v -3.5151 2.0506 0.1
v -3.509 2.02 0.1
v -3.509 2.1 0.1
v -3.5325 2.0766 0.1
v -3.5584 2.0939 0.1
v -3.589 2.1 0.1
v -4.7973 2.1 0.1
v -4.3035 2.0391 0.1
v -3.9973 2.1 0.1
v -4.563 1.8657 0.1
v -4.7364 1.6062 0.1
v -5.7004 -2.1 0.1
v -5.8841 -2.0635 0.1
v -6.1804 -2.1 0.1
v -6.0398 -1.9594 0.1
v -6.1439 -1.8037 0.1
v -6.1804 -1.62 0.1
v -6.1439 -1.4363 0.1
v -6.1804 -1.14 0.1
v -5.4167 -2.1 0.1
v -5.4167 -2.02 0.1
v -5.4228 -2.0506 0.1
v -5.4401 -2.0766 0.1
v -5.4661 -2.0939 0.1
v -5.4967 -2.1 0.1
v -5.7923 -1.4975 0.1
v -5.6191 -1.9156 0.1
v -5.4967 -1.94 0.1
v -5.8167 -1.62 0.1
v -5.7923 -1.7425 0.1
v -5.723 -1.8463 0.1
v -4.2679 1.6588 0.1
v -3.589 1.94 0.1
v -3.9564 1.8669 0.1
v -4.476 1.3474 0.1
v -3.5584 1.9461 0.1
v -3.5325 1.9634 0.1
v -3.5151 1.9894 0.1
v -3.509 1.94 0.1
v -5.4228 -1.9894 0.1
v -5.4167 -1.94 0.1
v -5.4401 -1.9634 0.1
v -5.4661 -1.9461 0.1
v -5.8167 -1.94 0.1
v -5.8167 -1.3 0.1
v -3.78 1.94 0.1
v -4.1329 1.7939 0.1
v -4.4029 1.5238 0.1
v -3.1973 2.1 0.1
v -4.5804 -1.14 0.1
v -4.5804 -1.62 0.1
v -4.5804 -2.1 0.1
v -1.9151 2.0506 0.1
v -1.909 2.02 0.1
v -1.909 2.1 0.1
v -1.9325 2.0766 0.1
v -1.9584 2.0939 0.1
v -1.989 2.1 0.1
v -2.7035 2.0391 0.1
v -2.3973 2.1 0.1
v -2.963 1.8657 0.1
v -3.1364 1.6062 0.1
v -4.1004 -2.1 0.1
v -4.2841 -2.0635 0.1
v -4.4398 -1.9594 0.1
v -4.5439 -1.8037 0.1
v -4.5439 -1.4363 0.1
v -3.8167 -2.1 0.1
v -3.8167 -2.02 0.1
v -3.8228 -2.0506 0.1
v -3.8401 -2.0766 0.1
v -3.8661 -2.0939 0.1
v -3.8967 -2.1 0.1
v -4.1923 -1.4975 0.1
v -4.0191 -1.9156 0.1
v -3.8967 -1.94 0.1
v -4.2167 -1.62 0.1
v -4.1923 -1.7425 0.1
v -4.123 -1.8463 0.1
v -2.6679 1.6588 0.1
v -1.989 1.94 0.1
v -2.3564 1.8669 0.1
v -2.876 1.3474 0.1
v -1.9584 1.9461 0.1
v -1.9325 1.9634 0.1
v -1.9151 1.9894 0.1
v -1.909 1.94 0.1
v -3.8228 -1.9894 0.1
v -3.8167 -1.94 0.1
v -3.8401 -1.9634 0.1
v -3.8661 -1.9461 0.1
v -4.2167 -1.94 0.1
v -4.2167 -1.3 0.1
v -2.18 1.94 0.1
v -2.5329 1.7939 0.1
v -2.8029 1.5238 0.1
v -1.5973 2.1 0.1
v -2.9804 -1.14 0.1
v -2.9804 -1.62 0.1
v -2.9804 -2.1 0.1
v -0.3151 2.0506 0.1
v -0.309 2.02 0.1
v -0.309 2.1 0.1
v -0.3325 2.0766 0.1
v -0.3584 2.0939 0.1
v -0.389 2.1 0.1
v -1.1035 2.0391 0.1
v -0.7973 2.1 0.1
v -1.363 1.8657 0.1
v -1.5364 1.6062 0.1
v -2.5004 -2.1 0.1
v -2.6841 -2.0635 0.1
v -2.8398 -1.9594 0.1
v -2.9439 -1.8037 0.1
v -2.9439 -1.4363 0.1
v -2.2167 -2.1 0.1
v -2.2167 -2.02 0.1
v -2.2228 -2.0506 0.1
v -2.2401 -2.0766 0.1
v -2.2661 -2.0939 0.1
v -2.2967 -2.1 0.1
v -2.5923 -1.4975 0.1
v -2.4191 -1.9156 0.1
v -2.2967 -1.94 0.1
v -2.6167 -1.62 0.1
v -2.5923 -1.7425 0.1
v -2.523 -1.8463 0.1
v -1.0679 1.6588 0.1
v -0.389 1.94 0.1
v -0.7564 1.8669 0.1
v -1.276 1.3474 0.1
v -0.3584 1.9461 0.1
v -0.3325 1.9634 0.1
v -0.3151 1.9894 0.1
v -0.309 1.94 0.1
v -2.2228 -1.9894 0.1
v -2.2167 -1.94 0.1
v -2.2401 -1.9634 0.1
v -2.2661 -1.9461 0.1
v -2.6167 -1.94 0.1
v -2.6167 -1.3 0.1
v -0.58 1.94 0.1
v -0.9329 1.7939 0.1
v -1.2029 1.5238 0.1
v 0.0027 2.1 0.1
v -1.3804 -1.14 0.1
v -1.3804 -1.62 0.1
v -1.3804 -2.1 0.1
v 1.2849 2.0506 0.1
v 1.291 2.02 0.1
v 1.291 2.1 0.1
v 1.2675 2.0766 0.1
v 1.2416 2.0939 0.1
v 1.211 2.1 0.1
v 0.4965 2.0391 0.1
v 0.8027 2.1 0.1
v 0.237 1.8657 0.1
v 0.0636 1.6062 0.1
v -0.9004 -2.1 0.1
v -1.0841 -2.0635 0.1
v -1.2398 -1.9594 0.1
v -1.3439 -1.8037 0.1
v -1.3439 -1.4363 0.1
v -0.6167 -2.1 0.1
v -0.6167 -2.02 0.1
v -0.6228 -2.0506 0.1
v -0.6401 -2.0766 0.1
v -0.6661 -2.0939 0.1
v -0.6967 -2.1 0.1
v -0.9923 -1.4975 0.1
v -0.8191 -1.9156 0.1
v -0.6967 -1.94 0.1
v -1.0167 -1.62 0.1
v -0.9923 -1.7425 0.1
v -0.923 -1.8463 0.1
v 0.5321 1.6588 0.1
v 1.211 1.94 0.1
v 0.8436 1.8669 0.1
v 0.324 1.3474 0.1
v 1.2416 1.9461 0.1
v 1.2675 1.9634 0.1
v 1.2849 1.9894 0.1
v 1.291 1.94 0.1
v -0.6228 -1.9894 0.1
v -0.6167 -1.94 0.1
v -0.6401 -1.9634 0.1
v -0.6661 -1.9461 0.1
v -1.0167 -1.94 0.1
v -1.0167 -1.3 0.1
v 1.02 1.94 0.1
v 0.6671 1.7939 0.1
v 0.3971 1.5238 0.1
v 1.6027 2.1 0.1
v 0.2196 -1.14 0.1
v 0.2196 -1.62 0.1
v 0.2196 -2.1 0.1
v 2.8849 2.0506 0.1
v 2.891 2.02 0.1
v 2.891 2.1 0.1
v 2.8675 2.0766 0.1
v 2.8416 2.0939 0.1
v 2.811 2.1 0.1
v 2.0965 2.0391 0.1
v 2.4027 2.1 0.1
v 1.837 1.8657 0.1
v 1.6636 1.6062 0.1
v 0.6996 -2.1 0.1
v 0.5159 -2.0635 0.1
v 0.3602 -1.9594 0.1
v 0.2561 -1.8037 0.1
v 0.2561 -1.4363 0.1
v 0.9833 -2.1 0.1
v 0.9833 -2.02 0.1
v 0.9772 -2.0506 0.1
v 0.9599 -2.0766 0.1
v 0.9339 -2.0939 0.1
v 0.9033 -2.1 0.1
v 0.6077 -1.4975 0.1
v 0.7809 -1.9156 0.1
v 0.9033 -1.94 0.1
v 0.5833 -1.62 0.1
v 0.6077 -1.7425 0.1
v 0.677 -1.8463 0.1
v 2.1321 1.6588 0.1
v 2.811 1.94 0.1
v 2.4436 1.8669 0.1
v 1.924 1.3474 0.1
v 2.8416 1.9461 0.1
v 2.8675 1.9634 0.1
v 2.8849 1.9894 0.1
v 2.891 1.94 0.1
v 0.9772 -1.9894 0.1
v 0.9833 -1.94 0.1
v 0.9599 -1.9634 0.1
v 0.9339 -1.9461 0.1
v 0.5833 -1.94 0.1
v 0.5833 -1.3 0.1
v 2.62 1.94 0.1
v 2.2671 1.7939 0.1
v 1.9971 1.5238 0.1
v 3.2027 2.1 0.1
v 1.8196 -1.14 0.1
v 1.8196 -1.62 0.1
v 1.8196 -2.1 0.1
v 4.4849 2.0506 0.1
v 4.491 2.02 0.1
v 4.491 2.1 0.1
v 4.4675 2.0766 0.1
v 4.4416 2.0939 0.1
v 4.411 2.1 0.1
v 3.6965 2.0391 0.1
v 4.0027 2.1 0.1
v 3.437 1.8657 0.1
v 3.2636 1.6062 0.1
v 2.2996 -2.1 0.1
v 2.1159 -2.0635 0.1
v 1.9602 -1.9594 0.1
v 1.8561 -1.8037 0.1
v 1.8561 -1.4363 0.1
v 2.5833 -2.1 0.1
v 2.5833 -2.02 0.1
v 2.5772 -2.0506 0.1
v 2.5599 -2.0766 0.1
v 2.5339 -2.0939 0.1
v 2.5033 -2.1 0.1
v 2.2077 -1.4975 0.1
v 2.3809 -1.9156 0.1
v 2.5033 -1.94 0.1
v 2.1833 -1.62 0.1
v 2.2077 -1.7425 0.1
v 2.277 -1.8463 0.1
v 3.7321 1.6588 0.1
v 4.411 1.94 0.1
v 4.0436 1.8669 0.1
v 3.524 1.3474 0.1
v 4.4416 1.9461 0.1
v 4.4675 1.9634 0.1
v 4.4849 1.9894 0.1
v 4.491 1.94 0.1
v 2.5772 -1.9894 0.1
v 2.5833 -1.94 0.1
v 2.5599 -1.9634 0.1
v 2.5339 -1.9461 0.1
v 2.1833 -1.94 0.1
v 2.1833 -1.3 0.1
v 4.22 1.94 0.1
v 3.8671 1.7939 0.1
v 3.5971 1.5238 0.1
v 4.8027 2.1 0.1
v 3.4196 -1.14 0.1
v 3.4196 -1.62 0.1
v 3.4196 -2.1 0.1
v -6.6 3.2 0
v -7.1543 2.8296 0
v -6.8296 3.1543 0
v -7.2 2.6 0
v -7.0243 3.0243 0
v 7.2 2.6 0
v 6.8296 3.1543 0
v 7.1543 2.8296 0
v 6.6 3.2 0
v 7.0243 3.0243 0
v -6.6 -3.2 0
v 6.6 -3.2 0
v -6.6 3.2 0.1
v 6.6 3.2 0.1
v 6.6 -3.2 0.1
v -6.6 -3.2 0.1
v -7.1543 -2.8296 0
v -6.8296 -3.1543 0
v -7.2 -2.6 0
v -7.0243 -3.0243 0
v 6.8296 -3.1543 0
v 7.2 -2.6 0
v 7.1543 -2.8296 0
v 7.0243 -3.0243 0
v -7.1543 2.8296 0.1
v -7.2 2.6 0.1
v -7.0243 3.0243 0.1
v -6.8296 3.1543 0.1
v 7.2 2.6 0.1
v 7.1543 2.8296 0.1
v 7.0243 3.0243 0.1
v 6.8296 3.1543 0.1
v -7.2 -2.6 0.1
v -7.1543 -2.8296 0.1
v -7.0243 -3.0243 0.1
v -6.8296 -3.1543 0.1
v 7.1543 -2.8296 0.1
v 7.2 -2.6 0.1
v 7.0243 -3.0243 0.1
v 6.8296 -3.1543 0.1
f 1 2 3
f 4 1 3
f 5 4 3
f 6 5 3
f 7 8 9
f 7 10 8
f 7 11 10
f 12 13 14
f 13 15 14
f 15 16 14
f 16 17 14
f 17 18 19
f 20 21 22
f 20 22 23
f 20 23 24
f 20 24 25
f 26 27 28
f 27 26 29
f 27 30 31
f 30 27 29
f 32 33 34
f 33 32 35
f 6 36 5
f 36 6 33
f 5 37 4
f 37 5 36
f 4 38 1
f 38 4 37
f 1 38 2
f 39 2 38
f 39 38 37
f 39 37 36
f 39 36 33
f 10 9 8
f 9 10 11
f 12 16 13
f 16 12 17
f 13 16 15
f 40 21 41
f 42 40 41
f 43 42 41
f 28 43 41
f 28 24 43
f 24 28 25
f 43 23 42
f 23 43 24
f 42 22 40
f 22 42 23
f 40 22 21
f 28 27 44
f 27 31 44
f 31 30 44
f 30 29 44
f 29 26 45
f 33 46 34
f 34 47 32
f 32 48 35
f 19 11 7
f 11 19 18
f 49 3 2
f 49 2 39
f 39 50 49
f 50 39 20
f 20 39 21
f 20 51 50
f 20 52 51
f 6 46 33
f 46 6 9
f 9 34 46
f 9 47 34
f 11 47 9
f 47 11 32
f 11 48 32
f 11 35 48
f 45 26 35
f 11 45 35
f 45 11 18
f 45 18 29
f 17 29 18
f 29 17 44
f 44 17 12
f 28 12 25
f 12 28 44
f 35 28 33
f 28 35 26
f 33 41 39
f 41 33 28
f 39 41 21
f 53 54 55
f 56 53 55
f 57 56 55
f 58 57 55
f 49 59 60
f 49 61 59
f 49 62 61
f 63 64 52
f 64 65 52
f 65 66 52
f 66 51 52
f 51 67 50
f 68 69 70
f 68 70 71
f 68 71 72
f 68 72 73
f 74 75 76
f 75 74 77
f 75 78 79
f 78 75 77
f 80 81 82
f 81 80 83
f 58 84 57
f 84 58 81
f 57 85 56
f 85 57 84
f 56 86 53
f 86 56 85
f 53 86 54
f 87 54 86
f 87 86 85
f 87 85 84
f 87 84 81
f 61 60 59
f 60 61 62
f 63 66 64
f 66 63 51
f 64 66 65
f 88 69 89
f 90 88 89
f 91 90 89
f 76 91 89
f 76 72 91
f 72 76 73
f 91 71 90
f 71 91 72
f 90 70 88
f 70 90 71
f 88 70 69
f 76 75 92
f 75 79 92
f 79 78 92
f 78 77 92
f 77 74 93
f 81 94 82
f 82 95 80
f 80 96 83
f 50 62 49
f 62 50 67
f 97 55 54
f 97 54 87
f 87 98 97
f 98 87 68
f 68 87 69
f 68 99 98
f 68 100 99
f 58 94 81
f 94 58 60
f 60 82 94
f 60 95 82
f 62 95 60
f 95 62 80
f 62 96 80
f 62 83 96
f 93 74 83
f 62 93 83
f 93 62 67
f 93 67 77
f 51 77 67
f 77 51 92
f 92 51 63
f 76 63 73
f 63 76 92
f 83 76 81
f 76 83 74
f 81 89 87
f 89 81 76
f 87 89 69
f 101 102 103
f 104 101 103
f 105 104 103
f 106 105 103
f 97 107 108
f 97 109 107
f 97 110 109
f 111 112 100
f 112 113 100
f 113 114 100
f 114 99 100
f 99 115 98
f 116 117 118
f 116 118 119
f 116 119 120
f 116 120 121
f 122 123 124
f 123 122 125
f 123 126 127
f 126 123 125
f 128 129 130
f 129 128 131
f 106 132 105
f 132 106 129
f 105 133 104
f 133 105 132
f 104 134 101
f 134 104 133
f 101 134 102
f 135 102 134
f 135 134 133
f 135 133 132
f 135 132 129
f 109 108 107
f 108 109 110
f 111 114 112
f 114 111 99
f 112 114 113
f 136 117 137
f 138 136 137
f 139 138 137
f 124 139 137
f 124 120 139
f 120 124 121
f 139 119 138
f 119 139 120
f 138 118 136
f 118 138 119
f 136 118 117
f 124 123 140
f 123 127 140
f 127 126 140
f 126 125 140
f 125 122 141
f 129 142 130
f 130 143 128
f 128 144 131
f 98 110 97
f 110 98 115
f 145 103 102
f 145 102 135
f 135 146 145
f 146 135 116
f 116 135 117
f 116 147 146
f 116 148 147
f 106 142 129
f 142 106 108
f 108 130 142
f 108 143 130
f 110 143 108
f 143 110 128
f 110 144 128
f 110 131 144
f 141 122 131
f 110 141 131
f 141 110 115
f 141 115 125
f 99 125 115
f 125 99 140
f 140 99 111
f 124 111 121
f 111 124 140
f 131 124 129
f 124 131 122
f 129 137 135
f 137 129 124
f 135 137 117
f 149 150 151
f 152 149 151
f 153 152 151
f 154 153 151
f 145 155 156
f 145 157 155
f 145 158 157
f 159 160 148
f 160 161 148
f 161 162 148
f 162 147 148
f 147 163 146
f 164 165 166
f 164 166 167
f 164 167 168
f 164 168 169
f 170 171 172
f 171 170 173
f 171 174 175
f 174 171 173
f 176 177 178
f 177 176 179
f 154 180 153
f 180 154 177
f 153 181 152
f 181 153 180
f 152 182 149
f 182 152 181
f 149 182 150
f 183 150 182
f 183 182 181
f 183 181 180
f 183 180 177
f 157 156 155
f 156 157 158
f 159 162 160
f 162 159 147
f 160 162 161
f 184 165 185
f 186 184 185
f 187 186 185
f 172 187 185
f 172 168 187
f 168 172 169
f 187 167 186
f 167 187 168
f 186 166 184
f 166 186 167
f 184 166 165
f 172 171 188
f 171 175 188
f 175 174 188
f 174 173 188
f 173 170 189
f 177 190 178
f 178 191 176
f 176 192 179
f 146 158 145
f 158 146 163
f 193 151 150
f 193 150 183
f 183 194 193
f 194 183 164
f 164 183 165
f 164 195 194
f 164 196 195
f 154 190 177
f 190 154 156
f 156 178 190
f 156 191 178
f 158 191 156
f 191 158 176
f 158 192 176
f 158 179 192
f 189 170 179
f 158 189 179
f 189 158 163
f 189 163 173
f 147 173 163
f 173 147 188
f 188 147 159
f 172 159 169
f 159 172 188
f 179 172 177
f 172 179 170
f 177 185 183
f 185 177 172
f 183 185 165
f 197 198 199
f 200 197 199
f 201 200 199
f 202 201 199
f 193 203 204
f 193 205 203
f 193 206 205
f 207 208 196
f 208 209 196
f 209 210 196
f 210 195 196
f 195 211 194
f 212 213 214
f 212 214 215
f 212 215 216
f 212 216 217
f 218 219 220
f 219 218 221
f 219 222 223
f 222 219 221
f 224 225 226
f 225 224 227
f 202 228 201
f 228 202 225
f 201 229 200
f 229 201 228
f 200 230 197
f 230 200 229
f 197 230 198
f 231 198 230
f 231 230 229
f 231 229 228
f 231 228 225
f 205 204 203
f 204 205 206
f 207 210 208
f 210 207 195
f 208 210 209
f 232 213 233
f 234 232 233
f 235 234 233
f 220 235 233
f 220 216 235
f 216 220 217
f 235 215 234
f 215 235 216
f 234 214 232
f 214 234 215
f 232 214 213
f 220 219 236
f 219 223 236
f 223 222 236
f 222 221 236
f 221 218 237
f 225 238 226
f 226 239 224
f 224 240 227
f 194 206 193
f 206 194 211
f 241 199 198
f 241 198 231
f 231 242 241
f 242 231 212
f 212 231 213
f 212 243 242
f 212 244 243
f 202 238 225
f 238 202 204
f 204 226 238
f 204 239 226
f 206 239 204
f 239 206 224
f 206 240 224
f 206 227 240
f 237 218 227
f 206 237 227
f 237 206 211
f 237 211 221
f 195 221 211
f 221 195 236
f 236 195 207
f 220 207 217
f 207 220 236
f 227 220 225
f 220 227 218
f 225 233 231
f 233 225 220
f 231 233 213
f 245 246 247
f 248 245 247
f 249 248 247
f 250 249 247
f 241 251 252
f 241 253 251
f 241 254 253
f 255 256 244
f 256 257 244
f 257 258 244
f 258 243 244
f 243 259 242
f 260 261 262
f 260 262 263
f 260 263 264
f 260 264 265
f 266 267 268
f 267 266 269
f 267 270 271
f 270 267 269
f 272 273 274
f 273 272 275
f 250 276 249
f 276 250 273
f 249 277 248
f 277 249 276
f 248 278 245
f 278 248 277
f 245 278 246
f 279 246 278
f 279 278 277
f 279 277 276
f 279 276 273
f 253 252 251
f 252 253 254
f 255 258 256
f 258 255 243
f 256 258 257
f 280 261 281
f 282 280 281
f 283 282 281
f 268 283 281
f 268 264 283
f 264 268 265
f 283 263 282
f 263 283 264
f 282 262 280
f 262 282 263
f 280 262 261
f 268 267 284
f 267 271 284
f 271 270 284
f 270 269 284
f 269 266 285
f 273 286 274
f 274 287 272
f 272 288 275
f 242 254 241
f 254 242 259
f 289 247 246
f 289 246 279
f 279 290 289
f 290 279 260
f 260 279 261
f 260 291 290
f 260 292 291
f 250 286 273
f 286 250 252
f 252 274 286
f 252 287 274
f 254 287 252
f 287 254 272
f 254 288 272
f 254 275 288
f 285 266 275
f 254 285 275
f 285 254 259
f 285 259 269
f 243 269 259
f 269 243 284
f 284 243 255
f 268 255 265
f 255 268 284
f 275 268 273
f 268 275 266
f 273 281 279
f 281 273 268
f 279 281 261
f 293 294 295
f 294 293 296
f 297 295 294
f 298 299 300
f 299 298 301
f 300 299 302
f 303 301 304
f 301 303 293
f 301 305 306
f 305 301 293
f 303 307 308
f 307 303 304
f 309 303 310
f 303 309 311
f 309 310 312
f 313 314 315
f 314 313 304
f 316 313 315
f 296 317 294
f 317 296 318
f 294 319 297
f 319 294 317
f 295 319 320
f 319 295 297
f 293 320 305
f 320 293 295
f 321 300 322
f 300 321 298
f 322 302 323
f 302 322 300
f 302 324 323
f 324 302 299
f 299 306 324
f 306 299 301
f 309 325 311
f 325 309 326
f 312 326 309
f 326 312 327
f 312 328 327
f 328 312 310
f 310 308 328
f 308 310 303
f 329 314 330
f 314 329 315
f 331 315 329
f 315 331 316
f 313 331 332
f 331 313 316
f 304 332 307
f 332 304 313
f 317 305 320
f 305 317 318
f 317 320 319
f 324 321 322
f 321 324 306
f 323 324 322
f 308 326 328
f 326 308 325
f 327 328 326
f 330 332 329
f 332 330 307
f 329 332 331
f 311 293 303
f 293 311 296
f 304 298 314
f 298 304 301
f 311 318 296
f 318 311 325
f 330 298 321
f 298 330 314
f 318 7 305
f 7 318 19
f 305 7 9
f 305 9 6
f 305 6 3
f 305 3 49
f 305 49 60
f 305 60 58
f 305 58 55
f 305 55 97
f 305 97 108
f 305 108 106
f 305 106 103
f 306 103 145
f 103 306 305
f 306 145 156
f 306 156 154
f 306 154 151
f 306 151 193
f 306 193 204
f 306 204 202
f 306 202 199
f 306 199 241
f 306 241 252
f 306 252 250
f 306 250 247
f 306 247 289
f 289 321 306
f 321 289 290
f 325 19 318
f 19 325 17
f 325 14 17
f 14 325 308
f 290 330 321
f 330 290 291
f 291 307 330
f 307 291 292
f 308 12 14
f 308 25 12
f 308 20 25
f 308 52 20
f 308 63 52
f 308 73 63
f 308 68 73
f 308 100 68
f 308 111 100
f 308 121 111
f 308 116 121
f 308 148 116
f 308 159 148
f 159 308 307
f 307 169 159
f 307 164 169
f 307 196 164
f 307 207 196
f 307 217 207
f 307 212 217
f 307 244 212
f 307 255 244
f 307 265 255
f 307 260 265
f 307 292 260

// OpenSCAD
// file: ../p/empty.scad
use <../lib.scad>
function ldraw_lib__empty() = [
// 0 Empty
// 0 Name: empty.dat
// 0 Author: Steffen [Steffen]
// 0 !LDRAW_ORG Primitive UPDATE 2015-01
// 0 !LICENSE Licensed under CC BY 4.0 : see CAreadme.txt
// 
// 0 BFC CERTIFY CCW
  [0,"BFC","CERTIFY"],
  [0,"BFC","CCW"],
// 
// 0 !HISTORY 2015-10-11 [PTadmin] Official Update 2015-01
// 
// 
// 0 // // Tool MLCad cannot handle really empty files. This file is used as a workaround.
// 0 // // It exceptionally contains forbidden non-LDRAW standard syntax to satisfy MLCad until it is fixed OR a different editor has become the de-facto LDRAW standard.
// 0 // // The line being used here is an "impossible" conditional line which never should be visible,
// 0 // // additionally hidden by a syntax explicitly hiding it from displaying.
// 
// 0 // MLCAD HIDE 5 24 0 0 0 0.0001 0 0 0.0001 -0.0001 0 0 0 0
];
module ldraw_lib__empty(step=0, col=false, unit=2/5, alt=false, line=0.2, solid=!$preview)
    makepoly(ldraw_lib__empty(), step=step, col=col, unit=unit, alt=alt, line=line, solid=solid);
ldraw_lib__empty(line=0.2);
// file: ../p/5-16ndis.scad
use <../lib.scad>
function ldraw_lib__5_16ndis() = [
// 0 Disc Negative 0.3125
// 0 Name: 5-16ndis.dat
// 0 Author: Max Martin Richter [MMR1988]
// 0 !LDRAW_ORG Primitive UPDATE 2013-01
// 0 !LICENSE Licensed under CC BY 4.0 : see CAreadme.txt
// 
// 0 BFC CERTIFY CCW
  [0,"BFC","CERTIFY"],
  [0,"BFC","CCW"],
// 
// 0 !HISTORY 2013-07-21 [PTadmin] Official Update 2013-01
// 
// 
// 3 16 1 0 1 0.9239 0 0.3827 1 0 0
  [3,16,1,0,1,0.9239,0,0.3827,1,0,0],
// 3 16 1 0 1 0.7071 0 0.7071 0.9239 0 0.3827
  [3,16,1,0,1,0.7071,0,0.7071,0.9239,0,0.3827],
// 3 16 1 0 1 0.3827 0 0.9239 0.7071 0 0.7071
  [3,16,1,0,1,0.3827,0,0.9239,0.7071,0,0.7071],
// 3 16 1 0 1 0 0 1 0.3827 0 0.9239
  [3,16,1,0,1,0,0,1,0.3827,0,0.9239],
// 3 16 -1 0 1 -0.3827 0 0.9239 0 0 1
  [3,16,-1,0,1,-0.3827,0,0.9239,0,0,1],
// 0 // Build by Primitive Generator 2
];
module ldraw_lib__5_16ndis(step=0, col=false, unit=2/5, alt=false, line=0.2, solid=!$preview)
    makepoly(ldraw_lib__5_16ndis(), step=step, col=col, unit=unit, alt=alt, line=line, solid=solid);
ldraw_lib__5_16ndis(line=0.2);
// file: ../p/5-16chrd.scad
use <../lib.scad>
function ldraw_lib__5_16chrd() = [
// 0 Chord 0.3125
// 0 Name: 5-16chrd.dat
// 0 Author: Niels Karsdorp [nielsk]
// 0 !LDRAW_ORG Primitive UPDATE 2010-01
// 0 !LICENSE Licensed under CC BY 4.0 : see CAreadme.txt
// 
// 0 BFC CERTIFY CCW
  [0,"BFC","CERTIFY"],
  [0,"BFC","CCW"],
// 
// 0 !HISTORY 2010-04-05 [PTadmin] Official Update 2010-01
// 
// 
// 4 16 1 0 0 0.9239 0 0.3827 0 0 1 -0.3827 0 0.9239
  [4,16,1,0,0,0.9239,0,0.3827,0,0,1,-0.3827,0,0.9239],
// 4 16 0.9239 0 0.3827 0.7071 0 0.7071 0.3827 0 0.9239 0 0 1
  [4,16,0.9239,0,0.3827,0.7071,0,0.7071,0.3827,0,0.9239,0,0,1],
// 0
// 
];
module ldraw_lib__5_16chrd(step=0, col=false, unit=2/5, alt=false, line=0.2, solid=!$preview)
    makepoly(ldraw_lib__5_16chrd(), step=step, col=col, unit=unit, alt=alt, line=line, solid=solid);
ldraw_lib__5_16chrd(line=0.2);
// file: ../p/3-16tang.scad
use <../lib.scad>
function ldraw_lib__3_16tang() = [
// 0 Disc Negative Tangent 0.1875
// 0 Name: 3-16tang.dat
// 0 Author: Massimo Maso [Sirio]
// 0 !LDRAW_ORG Primitive UPDATE 2022-03
// 0 !LICENSE Licensed under CC BY 4.0 : see CAreadme.txt
// 
// 0 BFC CERTIFY CCW
  [0,"BFC","CERTIFY"],
  [0,"BFC","CCW"],
// 
// 0 !HISTORY 2022-05-07 [PTadmin] Official Update 2022-03
// 
// 
// 3 16 1 0 0 1 0 0.1989 0.9239 0 0.3827
  [3,16,1,0,0,1,0,0.1989,0.9239,0,0.3827],
// 3 16 0.9239 0 0.3827 0.8478 0 0.5665 0.7071 0 0.7071
  [3,16,0.9239,0,0.3827,0.8478,0,0.5665,0.7071,0,0.7071],
// 3 16 0.7071 0 0.7071 0.5665 0 0.8478 0.3827 0 0.9239
  [3,16,0.7071,0,0.7071,0.5665,0,0.8478,0.3827,0,0.9239],
];
module ldraw_lib__3_16tang(step=0, col=false, unit=2/5, alt=false, line=0.2, solid=!$preview)
    makepoly(ldraw_lib__3_16tang(), step=step, col=col, unit=unit, alt=alt, line=line, solid=solid);
ldraw_lib__3_16tang(line=0.2);
// file: ../p/3-16ndis.scad
use <../lib.scad>
function ldraw_lib__3_16ndis() = [
// 0 Disc Negative 0.1875
// 0 Name: 3-16ndis.dat
// 0 Author: Magnus Forsberg [MagFors]
// 0 !LDRAW_ORG Primitive UPDATE 2024-01
// 0 !LICENSE Licensed under CC BY 4.0 : see CAreadme.txt
// 
// 0 BFC CERTIFY CCW
  [0,"BFC","CERTIFY"],
  [0,"BFC","CCW"],
// 
// 0 !HISTORY 2009-05-02 [PTadmin] Official Update 2009-01
// 0 !HISTORY 2024-01-03 [MagFors] Complete regeneration, original by guyvivan
// 0 !HISTORY 2024-01-29 [OrionP] Official Update 2024-01
// 
// 3 16 1 0 1 0.9239 0 0.3827 1 0 0
  [3,16,1,0,1,0.9239,0,0.3827,1,0,0],
// 3 16 1 0 1 0.7071 0 0.7071 0.9239 0 0.3827
  [3,16,1,0,1,0.7071,0,0.7071,0.9239,0,0.3827],
// 3 16 1 0 1 0.3827 0 0.9239 0.7071 0 0.7071
  [3,16,1,0,1,0.3827,0,0.9239,0.7071,0,0.7071],
// 0 // Build by LDPartEditor (PrimGen 2.X)
];
module ldraw_lib__3_16ndis(step=0, col=false, unit=2/5, alt=false, line=0.2, solid=!$preview)
    makepoly(ldraw_lib__3_16ndis(), step=step, col=col, unit=unit, alt=alt, line=line, solid=solid);
ldraw_lib__3_16ndis(line=0.2);
// file: ../p/3-16chrd.scad
use <../lib.scad>
function ldraw_lib__3_16chrd() = [
// 0 Chord 0.1875
// 0 Name: 3-16chrd.dat
// 0 Author: Niels Karsdorp [nielsk]
// 0 !LDRAW_ORG Primitive UPDATE 2009-01
// 0 !LICENSE Licensed under CC BY 4.0 : see CAreadme.txt
// 
// 0 BFC CERTIFY CCW
  [0,"BFC","CERTIFY"],
  [0,"BFC","CCW"],
// 
// 0 !HISTORY 2009-05-02 [PTadmin] Official Update 2009-01
// 
// 
// 4 16 1 0 0 0.9239 0 0.3827 0.7071 0 0.7071 0.3827 0 0.9239
  [4,16,1,0,0,0.9239,0,0.3827,0.7071,0,0.7071,0.3827,0,0.9239],
// 0
// 
];
module ldraw_lib__3_16chrd(step=0, col=false, unit=2/5, alt=false, line=0.2, solid=!$preview)
    makepoly(ldraw_lib__3_16chrd(), step=step, col=col, unit=unit, alt=alt, line=line, solid=solid);
ldraw_lib__3_16chrd(line=0.2);
// file: ../p/2-4chrd.scad
use <../lib.scad>
function ldraw_lib__2_4chrd() = [
// 0 Chord 0.5
// 0 Name: 2-4chrd.dat
// 0 Author: Philippe Hurbain [Philo]
// 0 !LDRAW_ORG Primitive UPDATE 2014-01
// 0 !LICENSE Licensed under CC BY 4.0 : see CAreadme.txt
// 
// 0 BFC CERTIFY CCW
  [0,"BFC","CERTIFY"],
  [0,"BFC","CCW"],
// 
// 0 !HISTORY 2014-06-21 [PTadmin] Official Update 2014-01
// 
// 
// 4 16 0.9239 0 0.3827 -0.9239 0 0.3827 -1 0 0 1 0 0
  [4,16,0.9239,0,0.3827,-0.9239,0,0.3827,-1,0,0,1,0,0],
// 4 16 0.7071 0 0.7071 -0.7071 0 0.7071 -0.9239 0 0.3827 0.9239 0 0.3827
  [4,16,0.7071,0,0.7071,-0.7071,0,0.7071,-0.9239,0,0.3827,0.9239,0,0.3827],
// 4 16 0.3827 0 0.9239 -0.3827 0 0.9239 -0.7071 0 0.7071 0.7071 0 0.7071
  [4,16,0.3827,0,0.9239,-0.3827,0,0.9239,-0.7071,0,0.7071,0.7071,0,0.7071],
// 3 16 0 0 1 -0.3827 0 0.9239 0.3827 0 0.9239
  [3,16,0,0,1,-0.3827,0,0.9239,0.3827,0,0.9239],
];
module ldraw_lib__2_4chrd(step=0, col=false, unit=2/5, alt=false, line=0.2, solid=!$preview)
    makepoly(ldraw_lib__2_4chrd(), step=step, col=col, unit=unit, alt=alt, line=line, solid=solid);
ldraw_lib__2_4chrd(line=0.2);
// file: ../p/1-4ndis.scad
use <../lib.scad>
function ldraw_lib__1_4ndis() = [
// 0 Disc Negative 0.25
// 0 Name: 1-4ndis.dat
// 0 Author: James Jessiman
// 0 !LDRAW_ORG Primitive UPDATE 2012-01
// 0 !LICENSE Licensed under CC BY 4.0 : see CAreadme.txt
// 
// 0 BFC CERTIFY CCW
  [0,"BFC","CERTIFY"],
  [0,"BFC","CCW"],
// 
// 0 !HISTORY 2002-03-23 [sbliss] Added BFC Statement
// 0 !HISTORY 2002-04-25 [PTadmin] Official Update 2002-02
// 0 !HISTORY 2007-06-22 [PTadmin] Header formatted for Contributor Agreement
// 0 !HISTORY 2008-07-01 [PTadmin] Official Update 2008-01
// 0 !HISTORY 2012-02-16 [Philo] Changed to CCW
// 0 !HISTORY 2012-03-30 [PTadmin] Official Update 2012-01
// 
// 
// 3 16 0.9239 0 0.3827 1 0 0 1 0 1
  [3,16,0.9239,0,0.3827,1,0,0,1,0,1],
// 3 16 0.7071 0 0.7071 0.9239 0 0.3827 1 0 1
  [3,16,0.7071,0,0.7071,0.9239,0,0.3827,1,0,1],
// 3 16 0.3827 0 0.9239 0.7071 0 0.7071 1 0 1
  [3,16,0.3827,0,0.9239,0.7071,0,0.7071,1,0,1],
// 3 16 0 0 1 0.3827 0 0.9239 1 0 1
  [3,16,0,0,1,0.3827,0,0.9239,1,0,1],
];
module ldraw_lib__1_4ndis(step=0, col=false, unit=2/5, alt=false, line=0.2, solid=!$preview)
    makepoly(ldraw_lib__1_4ndis(), step=step, col=col, unit=unit, alt=alt, line=line, solid=solid);
ldraw_lib__1_4ndis(line=0.2);
// file: ../p/1-16chrd.scad
use <../lib.scad>
use <empty.scad>
function ldraw_lib__1_16chrd() = [
// 0 Chord 0.0625
// 0 Name: 1-16chrd.dat
// 0 Author: Philippe Hurbain [Philo]
// 0 !LDRAW_ORG Primitive UPDATE 2015-01
// 0 !LICENSE Licensed under CC BY 4.0 : see CAreadme.txt
// 
// 0 BFC CERTIFY CCW
  [0,"BFC","CERTIFY"],
  [0,"BFC","CCW"],
// 
// 0 !HISTORY 2015-10-11 [PTadmin] Official Update 2015-01
// 
// 
// 0 // This file is intentionally empty because at the current \P resolution,
// 0 // an 1-16chrd is actually empty. However, this file still is present
// 0 // to allow tools to do primitives substition and fill in a real chrd here,
// 0 // or, if desired, to substitute this with the hi-res 48\1-16chrd.
// 
// 0 // This file is based on an idea by Darats at http://forums.ldraw.org/read.php?19,14500,14500#msg-14500
// 
// 1 16 0 0 0 1 0 0 0 1 0 0 0 1 empty.dat
  [1,16,0,0,0,1,0,0,0,1,0,0,0,1, ldraw_lib__empty()],
];
module ldraw_lib__1_16chrd(step=0, col=false, unit=2/5, alt=false, line=0.2, solid=!$preview)
    makepoly(ldraw_lib__1_16chrd(), step=step, col=col, unit=unit, alt=alt, line=line, solid=solid);
ldraw_lib__1_16chrd(line=0.2);
// file: s/6177741ss01.scad
use <../../lib.scad>
use <../../p/1-16chrd.scad>
use <../../p/1-4chrd.scad>
use <../../p/1-4ndis.scad>
use <../../p/2-4chrd.scad>
use <../../p/3-16chrd.scad>
use <../../p/3-16ndis.scad>
use <../../p/3-16tang.scad>
use <../../p/5-16chrd.scad>
use <../../p/5-16ndis.scad>
function ldraw_lib__s__6177741ss01() = [
// 0 ~Sticker  0.8 x  1.8 with Six Black Air Scope on Transparent Background Right - One Opening
// 0 Name: s\6177741ss01.dat
// 0 Author: Massimo Maso [Sirio]
// 0 !LDRAW_ORG Subpart UPDATE 2025-05
// 0 !LICENSE Licensed under CC BY 4.0 : see CAreadme.txt
// 
// 0 BFC CERTIFY CCW
  [0,"BFC","CERTIFY"],
  [0,"BFC","CCW"],
// 
// 0 !HISTORY 2025-05-28 [OrionP] Official Update 2025-05
// 
// 0 // Primitives
// 1 16 3.0274 0 5.05 .2 0 0 0 1 0 0 0 .2 1-4ndis.dat
  [1,16,3.0274,0,5.05,.2,0,0,0,1,0,0,0,.2, ldraw_lib__1_4ndis()],
// 1 16 2.0067 0 3.25 0 0 -2 0 1 0 2 0 0 3-16ndis.dat
  [1,16,2.0067,0,3.25,0,0,-2,0,1,0,2,0,0, ldraw_lib__3_16ndis()],
// 1 16 -2.251 0 -4.05 0 0 -1.2 0 1 0 -1.2 0 0 5-16ndis.dat
  [1,16,-2.251,0,-4.05,0,0,-1.2,0,1,0,-1.2,0,0, ldraw_lib__5_16ndis()],
// 1 16 -1.7417 0 -5.05 .2 0 0 0 1 0 0 0 -.2 1-4ndis.dat
  [1,16,-1.7417,0,-5.05,.2,0,0,0,1,0,0,0,-.2, ldraw_lib__1_4ndis()],
// 0 BFC NOCLIP
  [0,"BFC","NOCLIP"],
// 1 72 -1.7417 0 -4.05 0 0 -.8 0 1 0 -.8 0 0 5-16chrd.dat
  [1,72,-1.7417,0,-4.05,0,0,-.8,0,1,0,-.8,0,0, ldraw_lib__5_16chrd()],
// 1 72 3.0274 0 2.45 0 0 -2.4 0 1 0 2.4 0 0 3-16chrd.dat
  [1,72,3.0274,0,2.45,0,0,-2.4,0,1,0,2.4,0,0, ldraw_lib__3_16chrd()],
// 1 0 3.0274 0 5.05 0 0 .2 0 1 0 .2 0 0 2-4chrd.dat
  [1,0,3.0274,0,5.05,0,0,.2,0,1,0,.2,0,0, ldraw_lib__2_4chrd()],
// 1 71 3.0274 0 5.05 .2 0 0 0 1 0 0 0 -.2 1-4ndis.dat
  [1,71,3.0274,0,5.05,.2,0,0,0,1,0,0,0,-.2, ldraw_lib__1_4ndis()],
// 1 0 2.0067 0 3.25 0 0 -2 0 1 0 2 0 0 3-16chrd.dat
  [1,0,2.0067,0,3.25,0,0,-2,0,1,0,2,0,0, ldraw_lib__3_16chrd()],
// 1 0 -2.251 0 -4.05 -1.2 0 0 0 1 0 0 0 1.2 1-16chrd.dat
  [1,0,-2.251,0,-4.05,-1.2,0,0,0,1,0,0,0,1.2, ldraw_lib__1_16chrd()],
// 1 0 -2.251 0 -4.05 0 0 -1.2 0 1 0 -1.2 0 0 1-4chrd.dat
  [1,0,-2.251,0,-4.05,0,0,-1.2,0,1,0,-1.2,0,0, ldraw_lib__1_4chrd()],
// 1 71 -1.7417 0 -5.05 .2 0 0 0 1 0 0 0 .2 1-4ndis.dat
  [1,71,-1.7417,0,-5.05,.2,0,0,0,1,0,0,0,.2, ldraw_lib__1_4ndis()],
// 1 0 -1.7417 0 -5.05 0 0 .2 0 1 0 .2 0 0 2-4chrd.dat
  [1,0,-1.7417,0,-5.05,0,0,.2,0,1,0,.2,0,0, ldraw_lib__2_4chrd()],
// 1 0 -1.7417 0 -4.05 0 0 -.8 0 1 0 -.8 0 0 5-16ndis.dat
  [1,0,-1.7417,0,-4.05,0,0,-.8,0,1,0,-.8,0,0, ldraw_lib__5_16ndis()],
// 1 0 3.0274 0 2.45 0 0 -2.4 0 1 0 2.4 0 0 3-16tang.dat
  [1,0,3.0274,0,2.45,0,0,-2.4,0,1,0,2.4,0,0, ldraw_lib__3_16tang()],
// 0 BFC CLIP
  [0,"BFC","CLIP"],
// 0 // Trasparent faces
// 4 16 .0067 0 5.25 -3.451 0 -2.85 -3.35968 0 -3.59076 .1589 0 4.0154
  [4,16,.0067,0,5.25,-3.451,0,-2.85,-3.35968,0,-3.59076,.1589,0,4.0154],
// 3 16 4.0067 0 5.25 3.2274 0 5.25 3.2274 0 5.05
  [3,16,4.0067,0,5.25,3.2274,0,5.25,3.2274,0,5.05],
// 3 16 4.0067 0 5.25 3.2274 0 5.05 3.2274 0 4.85
  [3,16,4.0067,0,5.25,3.2274,0,5.05,3.2274,0,4.85],
// 4 16 4.0067 0 5.25 3.2274 0 4.85 -1.5417 0 -5.25 .549 0 -2.85
  [4,16,4.0067,0,5.25,3.2274,0,4.85,-1.5417,0,-5.25,.549,0,-2.85],
// 3 16 -1.5417 0 -5.25 3.2274 0 4.85 -1.5417 0 -5.05
  [3,16,-1.5417,0,-5.25,3.2274,0,4.85,-1.5417,0,-5.05],
// 3 16 -1.5417 0 -5.25 .549 0 -4.05 .549 0 -2.85
  [3,16,-1.5417,0,-5.25,.549,0,-4.05,.549,0,-2.85],
// 3 16 -1.5417 0 -5.25 .549 0 -5.25 .549 0 -4.05
  [3,16,-1.5417,0,-5.25,.549,0,-5.25,.549,0,-4.05],
// 0 BFC NOCLIP
  [0,"BFC","NOCLIP"],
// 0 // Black faces
// 4 0 2.0067 0 5.25 2.55004 0 4.85 3.0274 0 4.85 3.0274 0 5.25
  [4,0,2.0067,0,5.25,2.55004,0,4.85,3.0274,0,4.85,3.0274,0,5.25],
// 3 0 2.0067 0 5.25 2.10892 0 4.66736 2.55004 0 4.85
  [3,0,2.0067,0,5.25,2.10892,0,4.66736,2.55004,0,4.85],
// 3 0 2.0067 0 5.25 1.6678 0 4.48472 2.10892 0 4.66736
  [3,0,2.0067,0,5.25,1.6678,0,4.48472,2.10892,0,4.66736],
// 4 0 2.0067 0 5.25 .1589 0 4.0154 1.33036 0 4.14704 1.6678 0 4.48472
  [4,0,2.0067,0,5.25,.1589,0,4.0154,1.33036,0,4.14704,1.6678,0,4.48472],
// 3 0 .1589 0 4.0154 .99268 0 3.8096 1.33036 0 4.14704
  [3,0,.1589,0,4.0154,.99268,0,3.8096,1.33036,0,4.14704],
// 3 0 .1589 0 4.0154 .81004 0 3.36848 .99268 0 3.8096
  [3,0,.1589,0,4.0154,.81004,0,3.36848,.99268,0,3.8096],
// 3 0 -2.5417 0 -3.25 -2.48082 0 -3.74384 .81004 0 3.36848
  [3,0,-2.5417,0,-3.25,-2.48082,0,-3.74384,.81004,0,3.36848],
// 4 0 -2.5417 0 -3.25 .81004 0 3.36848 .1589 0 4.0154 -3.35968 0 -3.59076
  [4,0,-2.5417,0,-3.25,.81004,0,3.36848,.1589,0,4.0154,-3.35968,0,-3.59076],
// 3 0 -2.5417 0 -3.25 -3.35968 0 -3.59076 -2.5417 0 -4.05
  [3,0,-2.5417,0,-3.25,-3.35968,0,-3.59076,-2.5417,0,-4.05],
// 4 0 -2.5417 0 -4.85 -2.5417 0 -4.05 -3.35968 0 -3.59076 -3.451 0 -4.05
  [4,0,-2.5417,0,-4.85,-2.5417,0,-4.05,-3.35968,0,-3.59076,-3.451,0,-4.05],
// 3 0 -2.5417 0 -4.85 -3.451 0 -4.05 -2.251 0 -5.25
  [3,0,-2.5417,0,-4.85,-3.451,0,-4.05,-2.251,0,-5.25],
// 4 0 -2.5417 0 -4.85 -2.251 0 -5.25 -1.7417 0 -5.25 -1.7417 0 -4.85
  [4,0,-2.5417,0,-4.85,-2.251,0,-5.25,-1.7417,0,-5.25,-1.7417,0,-4.85],
// 0 // Halftone faces (actually 16 ndis and 0 disc)
// 4 72 3.0274 0 4.85 .81004 0 3.36848 -2.48082 0 -3.74384 -1.7417 0 -4.85
  [4,72,3.0274,0,4.85,.81004,0,3.36848,-2.48082,0,-3.74384,-1.7417,0,-4.85],
// 4 71 3.2274 0 4.85 3.0274 0 4.85 -1.7417 0 -4.85 -1.5417 0 -4.85
  [4,71,3.2274,0,4.85,3.0274,0,4.85,-1.7417,0,-4.85,-1.5417,0,-4.85],
// 3 71 3.2274 0 4.85 -1.5417 0 -4.85 -1.5417 0 -5.05
  [3,71,3.2274,0,4.85,-1.5417,0,-4.85,-1.5417,0,-5.05],
];
module ldraw_lib__s__6177741ss01(step=0, col=false, unit=2/5, alt=false, line=0.2, solid=!$preview)
    makepoly(ldraw_lib__s__6177741ss01(), step=step, col=col, unit=unit, alt=alt, line=line, solid=solid);
ldraw_lib__s__6177741ss01(line=0.2);
// file: ../p/box3u12.scad
use <../lib.scad>
function ldraw_lib__box3u12() = [
// 0 Box with 3 Parallel Faces without Any Edges
// 0 Name: box3u12.dat
// 0 Author: J.C. Tchang [tchang]
// 0 !LDRAW_ORG Primitive UPDATE 2014-02
// 0 !LICENSE Licensed under CC BY 4.0 : see CAreadme.txt
// 
// 0 BFC CERTIFY CCW
  [0,"BFC","CERTIFY"],
  [0,"BFC","CCW"],
// 
// 0 !HISTORY 2014-12-23 [PTadmin] Official Update 2014-02
// 
// 
// 4 16 -1 1 1 1 1 1 1 1 -1 -1 1 -1
  [4,16,-1,1,1,1,1,1,1,1,-1,-1,1,-1],
// 4 16 -1 1 1 -1 0 1 1 0 1 1 1 1
  [4,16,-1,1,1,-1,0,1,1,0,1,1,1,1],
// 4 16 1 1 -1 1 0 -1 -1 0 -1 -1 1 -1
  [4,16,1,1,-1,1,0,-1,-1,0,-1,-1,1,-1],
];
module ldraw_lib__box3u12(step=0, col=false, unit=2/5, alt=false, line=0.2, solid=!$preview)
    makepoly(ldraw_lib__box3u12(), step=step, col=col, unit=unit, alt=alt, line=line, solid=solid);
ldraw_lib__box3u12(line=0.2);
// file: ../p/1-4cyli.scad
use <../lib.scad>
function ldraw_lib__1_4cyli() = [
// 0 Cylinder 0.25
// 0 Name: 1-4cyli.dat
// 0 Author: James Jessiman
// 0 !LDRAW_ORG Primitive UPDATE 2012-01
// 0 !LICENSE Licensed under CC BY 4.0 : see CAreadme.txt
// 
// 0 BFC CERTIFY CCW
  [0,"BFC","CERTIFY"],
  [0,"BFC","CCW"],
// 
// 0 !HISTORY 2002-03-23 [sbliss] Added BFC statement.
// 0 !HISTORY 2002-04-25 [PTadmin] Official Update 2002-02
// 0 !HISTORY 2007-06-22 [PTadmin] Header formatted for Contributor Agreement
// 0 !HISTORY 2008-07-01 [PTadmin] Official Update 2008-01
// 0 !HISTORY 2012-02-16 [Philo] Changed to CCW
// 0 !HISTORY 2012-03-30 [PTadmin] Official Update 2012-01
// 
// 
// 4 16 1 1 0 0.9239 1 0.3827 0.9239 0 0.3827 1 0 0
  [4,16,1,1,0,0.9239,1,0.3827,0.9239,0,0.3827,1,0,0],
// 5 24 1 0 0 1 1 0 0.9239 0 0.3827 1 0 -1
  [5,24,1,0,0,1,1,0,0.9239,0,0.3827,1,0,-1],
// 4 16 0.9239 1 0.3827 0.7071 1 0.7071 0.7071 0 0.7071 0.9239 0 0.3827
  [4,16,0.9239,1,0.3827,0.7071,1,0.7071,0.7071,0,0.7071,0.9239,0,0.3827],
// 5 24 0.9239 0 0.3827 0.9239 1 0.3827 0.7071 0 0.7071 1 0 0
  [5,24,0.9239,0,0.3827,0.9239,1,0.3827,0.7071,0,0.7071,1,0,0],
// 4 16 0.7071 1 0.7071 0.3827 1 0.9239 0.3827 0 0.9239 0.7071 0 0.7071
  [4,16,0.7071,1,0.7071,0.3827,1,0.9239,0.3827,0,0.9239,0.7071,0,0.7071],
// 5 24 0.7071 0 0.7071 0.7071 1 0.7071 0.3827 0 0.9239 0.9239 0 0.3827
  [5,24,0.7071,0,0.7071,0.7071,1,0.7071,0.3827,0,0.9239,0.9239,0,0.3827],
// 4 16 0.3827 1 0.9239 0 1 1 0 0 1 0.3827 0 0.9239
  [4,16,0.3827,1,0.9239,0,1,1,0,0,1,0.3827,0,0.9239],
// 5 24 0.3827 0 0.9239 0.3827 1 0.9239 0 0 1 0.7071 0 0.7071
  [5,24,0.3827,0,0.9239,0.3827,1,0.9239,0,0,1,0.7071,0,0.7071],
// 5 24 0 0 1 0 1 1 0.3827 0 0.9239 -1 0 1
  [5,24,0,0,1,0,1,1,0.3827,0,0.9239,-1,0,1],
];
module ldraw_lib__1_4cyli(step=0, col=false, unit=2/5, alt=false, line=0.2, solid=!$preview)
    makepoly(ldraw_lib__1_4cyli(), step=step, col=col, unit=unit, alt=alt, line=line, solid=solid);
ldraw_lib__1_4cyli(line=0.2);
// file: ../p/1-4chrd.scad
use <../lib.scad>
function ldraw_lib__1_4chrd() = [
// 0 Chord 0.25
// 0 Name: 1-4chrd.dat
// 0 Author: Max Martin Richter [MMR1988]
// 0 !LDRAW_ORG Primitive UPDATE 2023-05
// 0 !LICENSE Licensed under CC BY 4.0 : see CAreadme.txt
// 
// 0 BFC CERTIFY CCW
  [0,"BFC","CERTIFY"],
  [0,"BFC","CCW"],
// 
// 0 !HISTORY 2004-04-22 [PTadmin] Official Update 2004-02
// 0 !HISTORY 2007-10-09 [PTadmin] Header formatted for Contributor Agreement
// 0 !HISTORY 2008-07-01 [PTadmin] Official Update 2008-01
// 0 !HISTORY 2012-08-02 [MMR1988] Re-creation with PrimGen2 and Rectifier
// 0 !HISTORY 2012-08-09 [PTadmin] Official Update 2012-02
// 0 !HISTORY 2023-10-27 [OrionP] Change author to MMR1988 from hafhead
// 0 !HISTORY 2023-10-31 [OrionP] Official Update 2023-05
// 
// 4 16 0.9239 0 0.3827 0.3827 0 0.9239 0 0 1 1 0 0
  [4,16,0.9239,0,0.3827,0.3827,0,0.9239,0,0,1,1,0,0],
// 3 16 0.7071 0 0.7071 0.3827 0 0.9239 0.9239 0 0.3827
  [3,16,0.7071,0,0.7071,0.3827,0,0.9239,0.9239,0,0.3827],
];
module ldraw_lib__1_4chrd(step=0, col=false, unit=2/5, alt=false, line=0.2, solid=!$preview)
    makepoly(ldraw_lib__1_4chrd(), step=step, col=col, unit=unit, alt=alt, line=line, solid=solid);
ldraw_lib__1_4chrd(line=0.2);
// main file
use <../lib.scad>
use <../p/1-4chrd.scad>
use <../p/1-4cyli.scad>
use <../p/box3u12.scad>
use <s/6177741ss01.scad>
function ldraw_lib__6177741s() = [
// 0 Sticker  0.8 x  1.8 with Six Black Air Scope on Transparent Background Right
// 0 Name: 6177741s.dat
// 0 Author: Massimo Maso [Sirio]
// 0 !LDRAW_ORG Part UPDATE 2025-05
// 0 !LICENSE Licensed under CC BY 4.0 : see CAreadme.txt
// 
// 0 !HELP Needs work: halftone areas are simplified because no high-resolution images are available
// 
// 0 BFC CERTIFY CCW
  [0,"BFC","CERTIFY"],
  [0,"BFC","CCW"],
// 
// 0 !KEYWORDS AMG, GT3, Mercedes, Set 75877, Speed Champions
// 
// 0 !HISTORY 2025-05-28 [OrionP] Official Update 2025-05
// 
// 
// 0 // Subparts
// 
// 1 16 -12 -.25 0 1 0 0 0 1 0 0 0 1 s\6177741ss01.dat
  [1,16,-12,-.25,0,1,0,0,0,1,0,0,0,1, ldraw_lib__s__6177741ss01()],
// 1 16 -8 -.25 0 1 0 0 0 1 0 0 0 1 s\6177741ss01.dat
  [1,16,-8,-.25,0,1,0,0,0,1,0,0,0,1, ldraw_lib__s__6177741ss01()],
// 1 16 -4 -.25 0 1 0 0 0 1 0 0 0 1 s\6177741ss01.dat
  [1,16,-4,-.25,0,1,0,0,0,1,0,0,0,1, ldraw_lib__s__6177741ss01()],
// 1 16 0 -.25 0 1 0 0 0 1 0 0 0 1 s\6177741ss01.dat
  [1,16,0,-.25,0,1,0,0,0,1,0,0,0,1, ldraw_lib__s__6177741ss01()],
// 1 16 4 -.25 0 1 0 0 0 1 0 0 0 1 s\6177741ss01.dat
  [1,16,4,-.25,0,1,0,0,0,1,0,0,0,1, ldraw_lib__s__6177741ss01()],
// 1 16 8 -.25 0 1 0 0 0 1 0 0 0 1 s\6177741ss01.dat
  [1,16,8,-.25,0,1,0,0,0,1,0,0,0,1, ldraw_lib__s__6177741ss01()],
// 0 // Primitives
// 1 16 -16.5 0 6.5 -1.5 0 0 0 -1 0 0 0 1.5 1-4chrd.dat
  [1,16,-16.5,0,6.5,-1.5,0,0,0,-1,0,0,0,1.5, ldraw_lib__1_4chrd()],
// 1 16 16.5 0 6.5 1.5 0 0 0 -1 0 0 0 1.5 1-4chrd.dat
  [1,16,16.5,0,6.5,1.5,0,0,0,-1,0,0,0,1.5, ldraw_lib__1_4chrd()],
// 1 16 0 -.25 0 16.5 0 0 0 .25 0 0 0 8 box3u12.dat
  [1,16,0,-.25,0,16.5,0,0,0,.25,0,0,0,8, ldraw_lib__box3u12()],
// 1 16 -16.5 0 -6.5 -1.5 0 0 0 -1 0 0 0 -1.5 1-4chrd.dat
  [1,16,-16.5,0,-6.5,-1.5,0,0,0,-1,0,0,0,-1.5, ldraw_lib__1_4chrd()],
// 1 16 16.5 0 -6.5 1.5 0 0 0 -1 0 0 0 -1.5 1-4chrd.dat
  [1,16,16.5,0,-6.5,1.5,0,0,0,-1,0,0,0,-1.5, ldraw_lib__1_4chrd()],
// 1 16 -16.5 0 6.5 -1.5 0 0 0 -.25 0 0 0 1.5 1-4cyli.dat
  [1,16,-16.5,0,6.5,-1.5,0,0,0,-.25,0,0,0,1.5, ldraw_lib__1_4cyli()],
// 1 16 16.5 0 6.5 1.5 0 0 0 -.25 0 0 0 1.5 1-4cyli.dat
  [1,16,16.5,0,6.5,1.5,0,0,0,-.25,0,0,0,1.5, ldraw_lib__1_4cyli()],
// 1 16 -16.5 0 -6.5 -1.5 0 0 0 -.25 0 0 0 -1.5 1-4cyli.dat
  [1,16,-16.5,0,-6.5,-1.5,0,0,0,-.25,0,0,0,-1.5, ldraw_lib__1_4cyli()],
// 1 16 16.5 0 -6.5 1.5 0 0 0 -.25 0 0 0 -1.5 1-4cyli.dat
  [1,16,16.5,0,-6.5,1.5,0,0,0,-.25,0,0,0,-1.5, ldraw_lib__1_4cyli()],
// 1 16 -16.5 -.25 6.5 -1.5 0 0 0 1 0 0 0 1.5 1-4chrd.dat
  [1,16,-16.5,-.25,6.5,-1.5,0,0,0,1,0,0,0,1.5, ldraw_lib__1_4chrd()],
// 1 16 16.5 -.25 6.5 1.5 0 0 0 1 0 0 0 1.5 1-4chrd.dat
  [1,16,16.5,-.25,6.5,1.5,0,0,0,1,0,0,0,1.5, ldraw_lib__1_4chrd()],
// 1 16 -16.5 -.25 -6.5 -1.5 0 0 0 1 0 0 0 -1.5 1-4chrd.dat
  [1,16,-16.5,-.25,-6.5,-1.5,0,0,0,1,0,0,0,-1.5, ldraw_lib__1_4chrd()],
// 1 16 16.5 -.25 -6.5 1.5 0 0 0 1 0 0 0 -1.5 1-4chrd.dat
  [1,16,16.5,-.25,-6.5,1.5,0,0,0,1,0,0,0,-1.5, ldraw_lib__1_4chrd()],
// 0 // Bottom faces
// 4 16 -16.5 0 8 -16.5 0 -8 -18 0 -6.5 -18 0 6.5
  [4,16,-16.5,0,8,-16.5,0,-8,-18,0,-6.5,-18,0,6.5],
// 4 16 16.5 0 8 18 0 6.5 18 0 -6.5 16.5 0 -8
  [4,16,16.5,0,8,18,0,6.5,18,0,-6.5,16.5,0,-8],
// 0 // Lateral faces
// 4 16 -18 0 6.5 -18 0 -6.5 -18 -.25 -6.5 -18 -.25 6.5
  [4,16,-18,0,6.5,-18,0,-6.5,-18,-.25,-6.5,-18,-.25,6.5],
// 4 16 18 0 6.5 18 -.25 6.5 18 -.25 -6.5 18 0 -6.5
  [4,16,18,0,6.5,18,-.25,6.5,18,-.25,-6.5,18,0,-6.5],
// 0 // Top faces
// 4 16 -16.5 -.25 8 -18 -.25 6.5 -15.451 -.25 -2.85 -11.9933 -.25 5.25
  [4,16,-16.5,-.25,8,-18,-.25,6.5,-15.451,-.25,-2.85,-11.9933,-.25,5.25],
// 3 16 -16.5 -.25 8 -11.9933 -.25 5.25 -9.9933 -.25 5.25
  [3,16,-16.5,-.25,8,-11.9933,-.25,5.25,-9.9933,-.25,5.25],
// 3 16 -16.5 -.25 8 -9.9933 -.25 5.25 -8.9726 -.25 5.25
  [3,16,-16.5,-.25,8,-9.9933,-.25,5.25,-8.9726,-.25,5.25],
// 3 16 -16.5 -.25 8 -8.9726 -.25 5.25 -8.7726 -.25 5.25
  [3,16,-16.5,-.25,8,-8.9726,-.25,5.25,-8.7726,-.25,5.25],
// 3 16 -16.5 -.25 8 -8.7726 -.25 5.25 -7.9933 -.25 5.25
  [3,16,-16.5,-.25,8,-8.7726,-.25,5.25,-7.9933,-.25,5.25],
// 3 16 -16.5 -.25 8 -7.9933 -.25 5.25 -5.9933 -.25 5.25
  [3,16,-16.5,-.25,8,-7.9933,-.25,5.25,-5.9933,-.25,5.25],
// 3 16 -16.5 -.25 8 -5.9933 -.25 5.25 -4.9726 -.25 5.25
  [3,16,-16.5,-.25,8,-5.9933,-.25,5.25,-4.9726,-.25,5.25],
// 3 16 -16.5 -.25 8 -4.9726 -.25 5.25 -4.7726 -.25 5.25
  [3,16,-16.5,-.25,8,-4.9726,-.25,5.25,-4.7726,-.25,5.25],
// 3 16 -16.5 -.25 8 -4.7726 -.25 5.25 -3.9933 -.25 5.25
  [3,16,-16.5,-.25,8,-4.7726,-.25,5.25,-3.9933,-.25,5.25],
// 3 16 -16.5 -.25 8 -3.9933 -.25 5.25 -1.9933 -.25 5.25
  [3,16,-16.5,-.25,8,-3.9933,-.25,5.25,-1.9933,-.25,5.25],
// 3 16 -16.5 -.25 8 -1.9933 -.25 5.25 -.9726 -.25 5.25
  [3,16,-16.5,-.25,8,-1.9933,-.25,5.25,-.9726,-.25,5.25],
// 3 16 -16.5 -.25 8 -.9726 -.25 5.25 -.7726 -.25 5.25
  [3,16,-16.5,-.25,8,-.9726,-.25,5.25,-.7726,-.25,5.25],
// 4 16 -16.5 -.25 8 -.7726 -.25 5.25 .0067 -.25 5.25 16.5 -.25 8
  [4,16,-16.5,-.25,8,-.7726,-.25,5.25,.0067,-.25,5.25,16.5,-.25,8],
// 3 16 16.5 -.25 8 .0067 -.25 5.25 2.0067 -.25 5.25
  [3,16,16.5,-.25,8,.0067,-.25,5.25,2.0067,-.25,5.25],
// 3 16 16.5 -.25 8 2.0067 -.25 5.25 3.0274 -.25 5.25
  [3,16,16.5,-.25,8,2.0067,-.25,5.25,3.0274,-.25,5.25],
// 3 16 16.5 -.25 8 3.0274 -.25 5.25 3.2274 -.25 5.25
  [3,16,16.5,-.25,8,3.0274,-.25,5.25,3.2274,-.25,5.25],
// 3 16 16.5 -.25 8 3.2274 -.25 5.25 4.0067 -.25 5.25
  [3,16,16.5,-.25,8,3.2274,-.25,5.25,4.0067,-.25,5.25],
// 3 16 16.5 -.25 8 4.0067 -.25 5.25 6.0067 -.25 5.25
  [3,16,16.5,-.25,8,4.0067,-.25,5.25,6.0067,-.25,5.25],
// 3 16 16.5 -.25 8 6.0067 -.25 5.25 7.0274 -.25 5.25
  [3,16,16.5,-.25,8,6.0067,-.25,5.25,7.0274,-.25,5.25],
// 3 16 16.5 -.25 8 7.0274 -.25 5.25 7.2274 -.25 5.25
  [3,16,16.5,-.25,8,7.0274,-.25,5.25,7.2274,-.25,5.25],
// 3 16 16.5 -.25 8 7.2274 -.25 5.25 8.0067 -.25 5.25
  [3,16,16.5,-.25,8,7.2274,-.25,5.25,8.0067,-.25,5.25],
// 3 16 16.5 -.25 8 8.0067 -.25 5.25 10.0067 -.25 5.25
  [3,16,16.5,-.25,8,8.0067,-.25,5.25,10.0067,-.25,5.25],
// 3 16 16.5 -.25 8 10.0067 -.25 5.25 11.0274 -.25 5.25
  [3,16,16.5,-.25,8,10.0067,-.25,5.25,11.0274,-.25,5.25],
// 3 16 16.5 -.25 8 11.0274 -.25 5.25 11.2274 -.25 5.25
  [3,16,16.5,-.25,8,11.0274,-.25,5.25,11.2274,-.25,5.25],
// 3 16 16.5 -.25 8 11.2274 -.25 5.25 12.0067 -.25 5.25
  [3,16,16.5,-.25,8,11.2274,-.25,5.25,12.0067,-.25,5.25],
// 4 16 16.5 -.25 8 12.0067 -.25 5.25 8.549 -.25 -2.85 18 -.25 6.5
  [4,16,16.5,-.25,8,12.0067,-.25,5.25,8.549,-.25,-2.85,18,-.25,6.5],
// 4 16 -18 -.25 -6.5 -15.451 -.25 -4.05 -15.451 -.25 -2.85 -18 -.25 6.5
  [4,16,-18,-.25,-6.5,-15.451,-.25,-4.05,-15.451,-.25,-2.85,-18,-.25,6.5],
// 4 16 -18 -.25 -6.5 -16.5 -.25 -8 -15.451 -.25 -5.25 -15.451 -.25 -4.05
  [4,16,-18,-.25,-6.5,-16.5,-.25,-8,-15.451,-.25,-5.25,-15.451,-.25,-4.05],
// 4 16 18 -.25 -6.5 18 -.25 6.5 8.549 -.25 -2.85 8.549 -.25 -4.05
  [4,16,18,-.25,-6.5,18,-.25,6.5,8.549,-.25,-2.85,8.549,-.25,-4.05],
// 4 16 18 -.25 -6.5 8.549 -.25 -4.05 8.549 -.25 -5.25 16.5 -.25 -8
  [4,16,18,-.25,-6.5,8.549,-.25,-4.05,8.549,-.25,-5.25,16.5,-.25,-8],
// 3 16 -16.5 -.25 -8 -14.251 -.25 -5.25 -15.451 -.25 -5.25
  [3,16,-16.5,-.25,-8,-14.251,-.25,-5.25,-15.451,-.25,-5.25],
// 3 16 -16.5 -.25 -8 -13.7417 -.25 -5.25 -14.251 -.25 -5.25
  [3,16,-16.5,-.25,-8,-13.7417,-.25,-5.25,-14.251,-.25,-5.25],
// 3 16 -16.5 -.25 -8 -13.5417 -.25 -5.25 -13.7417 -.25 -5.25
  [3,16,-16.5,-.25,-8,-13.5417,-.25,-5.25,-13.7417,-.25,-5.25],
// 3 16 -16.5 -.25 -8 -11.451 -.25 -5.25 -13.5417 -.25 -5.25
  [3,16,-16.5,-.25,-8,-11.451,-.25,-5.25,-13.5417,-.25,-5.25],
// 3 16 -16.5 -.25 -8 -10.251 -.25 -5.25 -11.451 -.25 -5.25
  [3,16,-16.5,-.25,-8,-10.251,-.25,-5.25,-11.451,-.25,-5.25],
// 3 16 -16.5 -.25 -8 -9.7417 -.25 -5.25 -10.251 -.25 -5.25
  [3,16,-16.5,-.25,-8,-9.7417,-.25,-5.25,-10.251,-.25,-5.25],
// 3 16 -16.5 -.25 -8 -9.5417 -.25 -5.25 -9.7417 -.25 -5.25
  [3,16,-16.5,-.25,-8,-9.5417,-.25,-5.25,-9.7417,-.25,-5.25],
// 3 16 -16.5 -.25 -8 -7.451 -.25 -5.25 -9.5417 -.25 -5.25
  [3,16,-16.5,-.25,-8,-7.451,-.25,-5.25,-9.5417,-.25,-5.25],
// 3 16 -16.5 -.25 -8 -6.251 -.25 -5.25 -7.451 -.25 -5.25
  [3,16,-16.5,-.25,-8,-6.251,-.25,-5.25,-7.451,-.25,-5.25],
// 3 16 -16.5 -.25 -8 -5.7417 -.25 -5.25 -6.251 -.25 -5.25
  [3,16,-16.5,-.25,-8,-5.7417,-.25,-5.25,-6.251,-.25,-5.25],
// 3 16 -16.5 -.25 -8 -5.5417 -.25 -5.25 -5.7417 -.25 -5.25
  [3,16,-16.5,-.25,-8,-5.5417,-.25,-5.25,-5.7417,-.25,-5.25],
// 3 16 -16.5 -.25 -8 -3.451 -.25 -5.25 -5.5417 -.25 -5.25
  [3,16,-16.5,-.25,-8,-3.451,-.25,-5.25,-5.5417,-.25,-5.25],
// 4 16 -16.5 -.25 -8 16.5 -.25 -8 -2.251 -.25 -5.25 -3.451 -.25 -5.25
  [4,16,-16.5,-.25,-8,16.5,-.25,-8,-2.251,-.25,-5.25,-3.451,-.25,-5.25],
// 3 16 16.5 -.25 -8 -1.7417 -.25 -5.25 -2.251 -.25 -5.25
  [3,16,16.5,-.25,-8,-1.7417,-.25,-5.25,-2.251,-.25,-5.25],
// 3 16 16.5 -.25 -8 -1.5417 -.25 -5.25 -1.7417 -.25 -5.25
  [3,16,16.5,-.25,-8,-1.5417,-.25,-5.25,-1.7417,-.25,-5.25],
// 3 16 16.5 -.25 -8 .549 -.25 -5.25 -1.5417 -.25 -5.25
  [3,16,16.5,-.25,-8,.549,-.25,-5.25,-1.5417,-.25,-5.25],
// 3 16 16.5 -.25 -8 1.749 -.25 -5.25 .549 -.25 -5.25
  [3,16,16.5,-.25,-8,1.749,-.25,-5.25,.549,-.25,-5.25],
// 3 16 16.5 -.25 -8 2.2583 -.25 -5.25 1.749 -.25 -5.25
  [3,16,16.5,-.25,-8,2.2583,-.25,-5.25,1.749,-.25,-5.25],
// 3 16 16.5 -.25 -8 2.4583 -.25 -5.25 2.2583 -.25 -5.25
  [3,16,16.5,-.25,-8,2.4583,-.25,-5.25,2.2583,-.25,-5.25],
// 3 16 16.5 -.25 -8 4.549 -.25 -5.25 2.4583 -.25 -5.25
  [3,16,16.5,-.25,-8,4.549,-.25,-5.25,2.4583,-.25,-5.25],
// 3 16 16.5 -.25 -8 5.749 -.25 -5.25 4.549 -.25 -5.25
  [3,16,16.5,-.25,-8,5.749,-.25,-5.25,4.549,-.25,-5.25],
// 3 16 16.5 -.25 -8 6.2583 -.25 -5.25 5.749 -.25 -5.25
  [3,16,16.5,-.25,-8,6.2583,-.25,-5.25,5.749,-.25,-5.25],
// 3 16 16.5 -.25 -8 6.4583 -.25 -5.25 6.2583 -.25 -5.25
  [3,16,16.5,-.25,-8,6.4583,-.25,-5.25,6.2583,-.25,-5.25],
// 3 16 16.5 -.25 -8 8.549 -.25 -5.25 6.4583 -.25 -5.25
  [3,16,16.5,-.25,-8,8.549,-.25,-5.25,6.4583,-.25,-5.25],
];
module ldraw_lib__6177741s(step=0, col=false, unit=2/5, alt=false, line=0.2, solid=!$preview)
    makepoly(ldraw_lib__6177741s(), step=step, col=col, unit=unit, alt=alt, line=line, solid=solid);
ldraw_lib__6177741s(line=0.2);
